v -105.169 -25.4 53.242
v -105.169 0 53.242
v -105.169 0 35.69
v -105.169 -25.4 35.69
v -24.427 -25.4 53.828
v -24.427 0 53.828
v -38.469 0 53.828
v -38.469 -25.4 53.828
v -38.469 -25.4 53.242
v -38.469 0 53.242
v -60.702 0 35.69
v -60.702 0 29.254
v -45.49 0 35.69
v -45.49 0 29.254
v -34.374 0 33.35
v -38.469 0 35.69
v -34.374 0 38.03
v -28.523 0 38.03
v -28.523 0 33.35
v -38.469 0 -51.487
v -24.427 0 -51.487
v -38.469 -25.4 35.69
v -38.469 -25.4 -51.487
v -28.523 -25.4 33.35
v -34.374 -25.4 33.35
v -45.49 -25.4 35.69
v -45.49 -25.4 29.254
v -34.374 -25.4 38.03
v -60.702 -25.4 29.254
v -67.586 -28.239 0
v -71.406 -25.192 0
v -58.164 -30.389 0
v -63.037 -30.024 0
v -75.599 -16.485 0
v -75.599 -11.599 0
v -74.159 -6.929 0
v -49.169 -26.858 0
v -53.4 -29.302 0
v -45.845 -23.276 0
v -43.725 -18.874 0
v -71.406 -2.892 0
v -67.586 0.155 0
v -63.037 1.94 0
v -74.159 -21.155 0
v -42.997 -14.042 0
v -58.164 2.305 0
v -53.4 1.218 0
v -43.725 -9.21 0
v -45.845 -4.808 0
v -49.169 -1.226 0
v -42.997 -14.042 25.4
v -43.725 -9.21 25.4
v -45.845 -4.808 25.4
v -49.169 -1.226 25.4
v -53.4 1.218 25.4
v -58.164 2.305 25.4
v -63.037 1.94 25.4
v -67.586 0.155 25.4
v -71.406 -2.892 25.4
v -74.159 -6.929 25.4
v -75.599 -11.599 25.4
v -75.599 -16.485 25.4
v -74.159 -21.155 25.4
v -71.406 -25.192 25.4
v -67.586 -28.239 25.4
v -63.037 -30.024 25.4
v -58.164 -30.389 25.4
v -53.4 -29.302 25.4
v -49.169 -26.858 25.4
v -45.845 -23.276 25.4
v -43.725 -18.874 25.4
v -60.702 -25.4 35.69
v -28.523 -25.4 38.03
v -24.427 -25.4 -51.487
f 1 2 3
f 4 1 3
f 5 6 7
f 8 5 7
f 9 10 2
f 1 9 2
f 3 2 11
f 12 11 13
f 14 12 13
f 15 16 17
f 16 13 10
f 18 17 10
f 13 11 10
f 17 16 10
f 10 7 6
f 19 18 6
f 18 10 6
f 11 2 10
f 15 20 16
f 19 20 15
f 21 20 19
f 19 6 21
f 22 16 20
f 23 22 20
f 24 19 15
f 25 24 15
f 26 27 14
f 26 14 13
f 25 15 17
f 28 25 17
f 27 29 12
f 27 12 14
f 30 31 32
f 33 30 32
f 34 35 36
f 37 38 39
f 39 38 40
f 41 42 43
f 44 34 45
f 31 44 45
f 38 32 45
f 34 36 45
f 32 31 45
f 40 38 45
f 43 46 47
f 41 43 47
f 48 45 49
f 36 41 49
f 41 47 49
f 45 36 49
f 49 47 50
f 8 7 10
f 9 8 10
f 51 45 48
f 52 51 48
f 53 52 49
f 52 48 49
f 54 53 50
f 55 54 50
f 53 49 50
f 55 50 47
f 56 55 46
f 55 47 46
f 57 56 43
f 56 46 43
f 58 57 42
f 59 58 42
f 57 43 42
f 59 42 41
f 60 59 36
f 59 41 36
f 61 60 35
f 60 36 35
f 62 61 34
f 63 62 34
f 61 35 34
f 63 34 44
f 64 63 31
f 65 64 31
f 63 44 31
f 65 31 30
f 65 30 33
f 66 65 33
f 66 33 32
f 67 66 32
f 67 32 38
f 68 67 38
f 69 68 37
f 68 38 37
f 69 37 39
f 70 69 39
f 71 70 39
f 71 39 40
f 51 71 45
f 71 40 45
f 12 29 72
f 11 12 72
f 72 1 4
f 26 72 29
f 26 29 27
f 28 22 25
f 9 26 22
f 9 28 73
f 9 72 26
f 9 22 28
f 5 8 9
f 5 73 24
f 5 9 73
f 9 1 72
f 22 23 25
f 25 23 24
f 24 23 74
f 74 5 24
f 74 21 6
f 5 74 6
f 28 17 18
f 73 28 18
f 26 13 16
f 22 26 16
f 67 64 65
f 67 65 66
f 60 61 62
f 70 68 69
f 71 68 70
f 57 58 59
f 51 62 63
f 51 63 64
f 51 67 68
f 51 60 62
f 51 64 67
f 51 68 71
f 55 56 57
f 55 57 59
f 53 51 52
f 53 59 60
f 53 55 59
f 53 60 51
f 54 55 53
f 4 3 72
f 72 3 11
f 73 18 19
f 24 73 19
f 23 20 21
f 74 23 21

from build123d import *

# Parameters (mm, degrees)
F0_W     = 15.2121409774
F0_H     = 6.4359065145
F0_W_2   = 14.0419714153
F0_H_2   = 69.039709866
F1_DEPTH = 25.4
F2_R     = 16.3927484783
F3_DEPTH = 25.4


with BuildPart() as f1:
    # F0 (on Front) → F1 (new body)
    with BuildSketch(Plane.XZ):
        Polygon((-34.3735795468, 33.3496890962), (-34.3735795468, 35.6900207698), (-38.4691562504, 35.6900207698), (-38.4691562504, 17.5524689257), (-24.4271848351, 17.5524689257), (-24.4271848351, 53.827572614), (-38.4691562504, 53.827572614), (-38.4691562504, 53.2424785197), (-31.4481705427, 53.2424785197), (-31.4481705427, 38.0303524435), (-28.5227615386, 38.0303524435), (-28.5227615386, 33.3496890962), align=None)
        Polygon((-38.4691562504, 35.6900207698), (-34.3735795468, 35.6900207698), (-34.3735795468, 38.0303524435), (-31.4481705427, 38.0303524435), (-31.4481705427, 53.2424785197), (-38.4691562504, 53.2424785197), align=None)
        Polygon((-45.4901456833, 35.6900207698), (-38.4691562504, 35.6900207698), (-38.4691562504, 53.2424785197), (-105.1685363054, 53.2424785197), (-105.1685363054, 35.6900207698), (-60.7022866607, 35.6900207698), (-60.7022866607, 42.1259272844), (-45.4901456833, 42.1259272844), align=None)
        with Locations((-53.096216172, 32.4720675126)):
            Rectangle(F0_W, F0_H)
        with Locations((-53.096216172, 38.9079740271)):
            Rectangle(F0_W, F0_H)
        with Locations((-31.4481705427, -16.9673860073)):
            Rectangle(F0_W_2, F0_H_2)
    extrude(amount=F1_DEPTH)


with BuildPart() as f3:
    # F2 (on Top) → F3 (new body)
    with BuildSketch(Plane.XY):
        with Locations((-59.3893304467, -14.0419751406)):
            Circle(F2_R)
    extrude(amount=F3_DEPTH)


solid = Compound([f1.part, f3.part])
